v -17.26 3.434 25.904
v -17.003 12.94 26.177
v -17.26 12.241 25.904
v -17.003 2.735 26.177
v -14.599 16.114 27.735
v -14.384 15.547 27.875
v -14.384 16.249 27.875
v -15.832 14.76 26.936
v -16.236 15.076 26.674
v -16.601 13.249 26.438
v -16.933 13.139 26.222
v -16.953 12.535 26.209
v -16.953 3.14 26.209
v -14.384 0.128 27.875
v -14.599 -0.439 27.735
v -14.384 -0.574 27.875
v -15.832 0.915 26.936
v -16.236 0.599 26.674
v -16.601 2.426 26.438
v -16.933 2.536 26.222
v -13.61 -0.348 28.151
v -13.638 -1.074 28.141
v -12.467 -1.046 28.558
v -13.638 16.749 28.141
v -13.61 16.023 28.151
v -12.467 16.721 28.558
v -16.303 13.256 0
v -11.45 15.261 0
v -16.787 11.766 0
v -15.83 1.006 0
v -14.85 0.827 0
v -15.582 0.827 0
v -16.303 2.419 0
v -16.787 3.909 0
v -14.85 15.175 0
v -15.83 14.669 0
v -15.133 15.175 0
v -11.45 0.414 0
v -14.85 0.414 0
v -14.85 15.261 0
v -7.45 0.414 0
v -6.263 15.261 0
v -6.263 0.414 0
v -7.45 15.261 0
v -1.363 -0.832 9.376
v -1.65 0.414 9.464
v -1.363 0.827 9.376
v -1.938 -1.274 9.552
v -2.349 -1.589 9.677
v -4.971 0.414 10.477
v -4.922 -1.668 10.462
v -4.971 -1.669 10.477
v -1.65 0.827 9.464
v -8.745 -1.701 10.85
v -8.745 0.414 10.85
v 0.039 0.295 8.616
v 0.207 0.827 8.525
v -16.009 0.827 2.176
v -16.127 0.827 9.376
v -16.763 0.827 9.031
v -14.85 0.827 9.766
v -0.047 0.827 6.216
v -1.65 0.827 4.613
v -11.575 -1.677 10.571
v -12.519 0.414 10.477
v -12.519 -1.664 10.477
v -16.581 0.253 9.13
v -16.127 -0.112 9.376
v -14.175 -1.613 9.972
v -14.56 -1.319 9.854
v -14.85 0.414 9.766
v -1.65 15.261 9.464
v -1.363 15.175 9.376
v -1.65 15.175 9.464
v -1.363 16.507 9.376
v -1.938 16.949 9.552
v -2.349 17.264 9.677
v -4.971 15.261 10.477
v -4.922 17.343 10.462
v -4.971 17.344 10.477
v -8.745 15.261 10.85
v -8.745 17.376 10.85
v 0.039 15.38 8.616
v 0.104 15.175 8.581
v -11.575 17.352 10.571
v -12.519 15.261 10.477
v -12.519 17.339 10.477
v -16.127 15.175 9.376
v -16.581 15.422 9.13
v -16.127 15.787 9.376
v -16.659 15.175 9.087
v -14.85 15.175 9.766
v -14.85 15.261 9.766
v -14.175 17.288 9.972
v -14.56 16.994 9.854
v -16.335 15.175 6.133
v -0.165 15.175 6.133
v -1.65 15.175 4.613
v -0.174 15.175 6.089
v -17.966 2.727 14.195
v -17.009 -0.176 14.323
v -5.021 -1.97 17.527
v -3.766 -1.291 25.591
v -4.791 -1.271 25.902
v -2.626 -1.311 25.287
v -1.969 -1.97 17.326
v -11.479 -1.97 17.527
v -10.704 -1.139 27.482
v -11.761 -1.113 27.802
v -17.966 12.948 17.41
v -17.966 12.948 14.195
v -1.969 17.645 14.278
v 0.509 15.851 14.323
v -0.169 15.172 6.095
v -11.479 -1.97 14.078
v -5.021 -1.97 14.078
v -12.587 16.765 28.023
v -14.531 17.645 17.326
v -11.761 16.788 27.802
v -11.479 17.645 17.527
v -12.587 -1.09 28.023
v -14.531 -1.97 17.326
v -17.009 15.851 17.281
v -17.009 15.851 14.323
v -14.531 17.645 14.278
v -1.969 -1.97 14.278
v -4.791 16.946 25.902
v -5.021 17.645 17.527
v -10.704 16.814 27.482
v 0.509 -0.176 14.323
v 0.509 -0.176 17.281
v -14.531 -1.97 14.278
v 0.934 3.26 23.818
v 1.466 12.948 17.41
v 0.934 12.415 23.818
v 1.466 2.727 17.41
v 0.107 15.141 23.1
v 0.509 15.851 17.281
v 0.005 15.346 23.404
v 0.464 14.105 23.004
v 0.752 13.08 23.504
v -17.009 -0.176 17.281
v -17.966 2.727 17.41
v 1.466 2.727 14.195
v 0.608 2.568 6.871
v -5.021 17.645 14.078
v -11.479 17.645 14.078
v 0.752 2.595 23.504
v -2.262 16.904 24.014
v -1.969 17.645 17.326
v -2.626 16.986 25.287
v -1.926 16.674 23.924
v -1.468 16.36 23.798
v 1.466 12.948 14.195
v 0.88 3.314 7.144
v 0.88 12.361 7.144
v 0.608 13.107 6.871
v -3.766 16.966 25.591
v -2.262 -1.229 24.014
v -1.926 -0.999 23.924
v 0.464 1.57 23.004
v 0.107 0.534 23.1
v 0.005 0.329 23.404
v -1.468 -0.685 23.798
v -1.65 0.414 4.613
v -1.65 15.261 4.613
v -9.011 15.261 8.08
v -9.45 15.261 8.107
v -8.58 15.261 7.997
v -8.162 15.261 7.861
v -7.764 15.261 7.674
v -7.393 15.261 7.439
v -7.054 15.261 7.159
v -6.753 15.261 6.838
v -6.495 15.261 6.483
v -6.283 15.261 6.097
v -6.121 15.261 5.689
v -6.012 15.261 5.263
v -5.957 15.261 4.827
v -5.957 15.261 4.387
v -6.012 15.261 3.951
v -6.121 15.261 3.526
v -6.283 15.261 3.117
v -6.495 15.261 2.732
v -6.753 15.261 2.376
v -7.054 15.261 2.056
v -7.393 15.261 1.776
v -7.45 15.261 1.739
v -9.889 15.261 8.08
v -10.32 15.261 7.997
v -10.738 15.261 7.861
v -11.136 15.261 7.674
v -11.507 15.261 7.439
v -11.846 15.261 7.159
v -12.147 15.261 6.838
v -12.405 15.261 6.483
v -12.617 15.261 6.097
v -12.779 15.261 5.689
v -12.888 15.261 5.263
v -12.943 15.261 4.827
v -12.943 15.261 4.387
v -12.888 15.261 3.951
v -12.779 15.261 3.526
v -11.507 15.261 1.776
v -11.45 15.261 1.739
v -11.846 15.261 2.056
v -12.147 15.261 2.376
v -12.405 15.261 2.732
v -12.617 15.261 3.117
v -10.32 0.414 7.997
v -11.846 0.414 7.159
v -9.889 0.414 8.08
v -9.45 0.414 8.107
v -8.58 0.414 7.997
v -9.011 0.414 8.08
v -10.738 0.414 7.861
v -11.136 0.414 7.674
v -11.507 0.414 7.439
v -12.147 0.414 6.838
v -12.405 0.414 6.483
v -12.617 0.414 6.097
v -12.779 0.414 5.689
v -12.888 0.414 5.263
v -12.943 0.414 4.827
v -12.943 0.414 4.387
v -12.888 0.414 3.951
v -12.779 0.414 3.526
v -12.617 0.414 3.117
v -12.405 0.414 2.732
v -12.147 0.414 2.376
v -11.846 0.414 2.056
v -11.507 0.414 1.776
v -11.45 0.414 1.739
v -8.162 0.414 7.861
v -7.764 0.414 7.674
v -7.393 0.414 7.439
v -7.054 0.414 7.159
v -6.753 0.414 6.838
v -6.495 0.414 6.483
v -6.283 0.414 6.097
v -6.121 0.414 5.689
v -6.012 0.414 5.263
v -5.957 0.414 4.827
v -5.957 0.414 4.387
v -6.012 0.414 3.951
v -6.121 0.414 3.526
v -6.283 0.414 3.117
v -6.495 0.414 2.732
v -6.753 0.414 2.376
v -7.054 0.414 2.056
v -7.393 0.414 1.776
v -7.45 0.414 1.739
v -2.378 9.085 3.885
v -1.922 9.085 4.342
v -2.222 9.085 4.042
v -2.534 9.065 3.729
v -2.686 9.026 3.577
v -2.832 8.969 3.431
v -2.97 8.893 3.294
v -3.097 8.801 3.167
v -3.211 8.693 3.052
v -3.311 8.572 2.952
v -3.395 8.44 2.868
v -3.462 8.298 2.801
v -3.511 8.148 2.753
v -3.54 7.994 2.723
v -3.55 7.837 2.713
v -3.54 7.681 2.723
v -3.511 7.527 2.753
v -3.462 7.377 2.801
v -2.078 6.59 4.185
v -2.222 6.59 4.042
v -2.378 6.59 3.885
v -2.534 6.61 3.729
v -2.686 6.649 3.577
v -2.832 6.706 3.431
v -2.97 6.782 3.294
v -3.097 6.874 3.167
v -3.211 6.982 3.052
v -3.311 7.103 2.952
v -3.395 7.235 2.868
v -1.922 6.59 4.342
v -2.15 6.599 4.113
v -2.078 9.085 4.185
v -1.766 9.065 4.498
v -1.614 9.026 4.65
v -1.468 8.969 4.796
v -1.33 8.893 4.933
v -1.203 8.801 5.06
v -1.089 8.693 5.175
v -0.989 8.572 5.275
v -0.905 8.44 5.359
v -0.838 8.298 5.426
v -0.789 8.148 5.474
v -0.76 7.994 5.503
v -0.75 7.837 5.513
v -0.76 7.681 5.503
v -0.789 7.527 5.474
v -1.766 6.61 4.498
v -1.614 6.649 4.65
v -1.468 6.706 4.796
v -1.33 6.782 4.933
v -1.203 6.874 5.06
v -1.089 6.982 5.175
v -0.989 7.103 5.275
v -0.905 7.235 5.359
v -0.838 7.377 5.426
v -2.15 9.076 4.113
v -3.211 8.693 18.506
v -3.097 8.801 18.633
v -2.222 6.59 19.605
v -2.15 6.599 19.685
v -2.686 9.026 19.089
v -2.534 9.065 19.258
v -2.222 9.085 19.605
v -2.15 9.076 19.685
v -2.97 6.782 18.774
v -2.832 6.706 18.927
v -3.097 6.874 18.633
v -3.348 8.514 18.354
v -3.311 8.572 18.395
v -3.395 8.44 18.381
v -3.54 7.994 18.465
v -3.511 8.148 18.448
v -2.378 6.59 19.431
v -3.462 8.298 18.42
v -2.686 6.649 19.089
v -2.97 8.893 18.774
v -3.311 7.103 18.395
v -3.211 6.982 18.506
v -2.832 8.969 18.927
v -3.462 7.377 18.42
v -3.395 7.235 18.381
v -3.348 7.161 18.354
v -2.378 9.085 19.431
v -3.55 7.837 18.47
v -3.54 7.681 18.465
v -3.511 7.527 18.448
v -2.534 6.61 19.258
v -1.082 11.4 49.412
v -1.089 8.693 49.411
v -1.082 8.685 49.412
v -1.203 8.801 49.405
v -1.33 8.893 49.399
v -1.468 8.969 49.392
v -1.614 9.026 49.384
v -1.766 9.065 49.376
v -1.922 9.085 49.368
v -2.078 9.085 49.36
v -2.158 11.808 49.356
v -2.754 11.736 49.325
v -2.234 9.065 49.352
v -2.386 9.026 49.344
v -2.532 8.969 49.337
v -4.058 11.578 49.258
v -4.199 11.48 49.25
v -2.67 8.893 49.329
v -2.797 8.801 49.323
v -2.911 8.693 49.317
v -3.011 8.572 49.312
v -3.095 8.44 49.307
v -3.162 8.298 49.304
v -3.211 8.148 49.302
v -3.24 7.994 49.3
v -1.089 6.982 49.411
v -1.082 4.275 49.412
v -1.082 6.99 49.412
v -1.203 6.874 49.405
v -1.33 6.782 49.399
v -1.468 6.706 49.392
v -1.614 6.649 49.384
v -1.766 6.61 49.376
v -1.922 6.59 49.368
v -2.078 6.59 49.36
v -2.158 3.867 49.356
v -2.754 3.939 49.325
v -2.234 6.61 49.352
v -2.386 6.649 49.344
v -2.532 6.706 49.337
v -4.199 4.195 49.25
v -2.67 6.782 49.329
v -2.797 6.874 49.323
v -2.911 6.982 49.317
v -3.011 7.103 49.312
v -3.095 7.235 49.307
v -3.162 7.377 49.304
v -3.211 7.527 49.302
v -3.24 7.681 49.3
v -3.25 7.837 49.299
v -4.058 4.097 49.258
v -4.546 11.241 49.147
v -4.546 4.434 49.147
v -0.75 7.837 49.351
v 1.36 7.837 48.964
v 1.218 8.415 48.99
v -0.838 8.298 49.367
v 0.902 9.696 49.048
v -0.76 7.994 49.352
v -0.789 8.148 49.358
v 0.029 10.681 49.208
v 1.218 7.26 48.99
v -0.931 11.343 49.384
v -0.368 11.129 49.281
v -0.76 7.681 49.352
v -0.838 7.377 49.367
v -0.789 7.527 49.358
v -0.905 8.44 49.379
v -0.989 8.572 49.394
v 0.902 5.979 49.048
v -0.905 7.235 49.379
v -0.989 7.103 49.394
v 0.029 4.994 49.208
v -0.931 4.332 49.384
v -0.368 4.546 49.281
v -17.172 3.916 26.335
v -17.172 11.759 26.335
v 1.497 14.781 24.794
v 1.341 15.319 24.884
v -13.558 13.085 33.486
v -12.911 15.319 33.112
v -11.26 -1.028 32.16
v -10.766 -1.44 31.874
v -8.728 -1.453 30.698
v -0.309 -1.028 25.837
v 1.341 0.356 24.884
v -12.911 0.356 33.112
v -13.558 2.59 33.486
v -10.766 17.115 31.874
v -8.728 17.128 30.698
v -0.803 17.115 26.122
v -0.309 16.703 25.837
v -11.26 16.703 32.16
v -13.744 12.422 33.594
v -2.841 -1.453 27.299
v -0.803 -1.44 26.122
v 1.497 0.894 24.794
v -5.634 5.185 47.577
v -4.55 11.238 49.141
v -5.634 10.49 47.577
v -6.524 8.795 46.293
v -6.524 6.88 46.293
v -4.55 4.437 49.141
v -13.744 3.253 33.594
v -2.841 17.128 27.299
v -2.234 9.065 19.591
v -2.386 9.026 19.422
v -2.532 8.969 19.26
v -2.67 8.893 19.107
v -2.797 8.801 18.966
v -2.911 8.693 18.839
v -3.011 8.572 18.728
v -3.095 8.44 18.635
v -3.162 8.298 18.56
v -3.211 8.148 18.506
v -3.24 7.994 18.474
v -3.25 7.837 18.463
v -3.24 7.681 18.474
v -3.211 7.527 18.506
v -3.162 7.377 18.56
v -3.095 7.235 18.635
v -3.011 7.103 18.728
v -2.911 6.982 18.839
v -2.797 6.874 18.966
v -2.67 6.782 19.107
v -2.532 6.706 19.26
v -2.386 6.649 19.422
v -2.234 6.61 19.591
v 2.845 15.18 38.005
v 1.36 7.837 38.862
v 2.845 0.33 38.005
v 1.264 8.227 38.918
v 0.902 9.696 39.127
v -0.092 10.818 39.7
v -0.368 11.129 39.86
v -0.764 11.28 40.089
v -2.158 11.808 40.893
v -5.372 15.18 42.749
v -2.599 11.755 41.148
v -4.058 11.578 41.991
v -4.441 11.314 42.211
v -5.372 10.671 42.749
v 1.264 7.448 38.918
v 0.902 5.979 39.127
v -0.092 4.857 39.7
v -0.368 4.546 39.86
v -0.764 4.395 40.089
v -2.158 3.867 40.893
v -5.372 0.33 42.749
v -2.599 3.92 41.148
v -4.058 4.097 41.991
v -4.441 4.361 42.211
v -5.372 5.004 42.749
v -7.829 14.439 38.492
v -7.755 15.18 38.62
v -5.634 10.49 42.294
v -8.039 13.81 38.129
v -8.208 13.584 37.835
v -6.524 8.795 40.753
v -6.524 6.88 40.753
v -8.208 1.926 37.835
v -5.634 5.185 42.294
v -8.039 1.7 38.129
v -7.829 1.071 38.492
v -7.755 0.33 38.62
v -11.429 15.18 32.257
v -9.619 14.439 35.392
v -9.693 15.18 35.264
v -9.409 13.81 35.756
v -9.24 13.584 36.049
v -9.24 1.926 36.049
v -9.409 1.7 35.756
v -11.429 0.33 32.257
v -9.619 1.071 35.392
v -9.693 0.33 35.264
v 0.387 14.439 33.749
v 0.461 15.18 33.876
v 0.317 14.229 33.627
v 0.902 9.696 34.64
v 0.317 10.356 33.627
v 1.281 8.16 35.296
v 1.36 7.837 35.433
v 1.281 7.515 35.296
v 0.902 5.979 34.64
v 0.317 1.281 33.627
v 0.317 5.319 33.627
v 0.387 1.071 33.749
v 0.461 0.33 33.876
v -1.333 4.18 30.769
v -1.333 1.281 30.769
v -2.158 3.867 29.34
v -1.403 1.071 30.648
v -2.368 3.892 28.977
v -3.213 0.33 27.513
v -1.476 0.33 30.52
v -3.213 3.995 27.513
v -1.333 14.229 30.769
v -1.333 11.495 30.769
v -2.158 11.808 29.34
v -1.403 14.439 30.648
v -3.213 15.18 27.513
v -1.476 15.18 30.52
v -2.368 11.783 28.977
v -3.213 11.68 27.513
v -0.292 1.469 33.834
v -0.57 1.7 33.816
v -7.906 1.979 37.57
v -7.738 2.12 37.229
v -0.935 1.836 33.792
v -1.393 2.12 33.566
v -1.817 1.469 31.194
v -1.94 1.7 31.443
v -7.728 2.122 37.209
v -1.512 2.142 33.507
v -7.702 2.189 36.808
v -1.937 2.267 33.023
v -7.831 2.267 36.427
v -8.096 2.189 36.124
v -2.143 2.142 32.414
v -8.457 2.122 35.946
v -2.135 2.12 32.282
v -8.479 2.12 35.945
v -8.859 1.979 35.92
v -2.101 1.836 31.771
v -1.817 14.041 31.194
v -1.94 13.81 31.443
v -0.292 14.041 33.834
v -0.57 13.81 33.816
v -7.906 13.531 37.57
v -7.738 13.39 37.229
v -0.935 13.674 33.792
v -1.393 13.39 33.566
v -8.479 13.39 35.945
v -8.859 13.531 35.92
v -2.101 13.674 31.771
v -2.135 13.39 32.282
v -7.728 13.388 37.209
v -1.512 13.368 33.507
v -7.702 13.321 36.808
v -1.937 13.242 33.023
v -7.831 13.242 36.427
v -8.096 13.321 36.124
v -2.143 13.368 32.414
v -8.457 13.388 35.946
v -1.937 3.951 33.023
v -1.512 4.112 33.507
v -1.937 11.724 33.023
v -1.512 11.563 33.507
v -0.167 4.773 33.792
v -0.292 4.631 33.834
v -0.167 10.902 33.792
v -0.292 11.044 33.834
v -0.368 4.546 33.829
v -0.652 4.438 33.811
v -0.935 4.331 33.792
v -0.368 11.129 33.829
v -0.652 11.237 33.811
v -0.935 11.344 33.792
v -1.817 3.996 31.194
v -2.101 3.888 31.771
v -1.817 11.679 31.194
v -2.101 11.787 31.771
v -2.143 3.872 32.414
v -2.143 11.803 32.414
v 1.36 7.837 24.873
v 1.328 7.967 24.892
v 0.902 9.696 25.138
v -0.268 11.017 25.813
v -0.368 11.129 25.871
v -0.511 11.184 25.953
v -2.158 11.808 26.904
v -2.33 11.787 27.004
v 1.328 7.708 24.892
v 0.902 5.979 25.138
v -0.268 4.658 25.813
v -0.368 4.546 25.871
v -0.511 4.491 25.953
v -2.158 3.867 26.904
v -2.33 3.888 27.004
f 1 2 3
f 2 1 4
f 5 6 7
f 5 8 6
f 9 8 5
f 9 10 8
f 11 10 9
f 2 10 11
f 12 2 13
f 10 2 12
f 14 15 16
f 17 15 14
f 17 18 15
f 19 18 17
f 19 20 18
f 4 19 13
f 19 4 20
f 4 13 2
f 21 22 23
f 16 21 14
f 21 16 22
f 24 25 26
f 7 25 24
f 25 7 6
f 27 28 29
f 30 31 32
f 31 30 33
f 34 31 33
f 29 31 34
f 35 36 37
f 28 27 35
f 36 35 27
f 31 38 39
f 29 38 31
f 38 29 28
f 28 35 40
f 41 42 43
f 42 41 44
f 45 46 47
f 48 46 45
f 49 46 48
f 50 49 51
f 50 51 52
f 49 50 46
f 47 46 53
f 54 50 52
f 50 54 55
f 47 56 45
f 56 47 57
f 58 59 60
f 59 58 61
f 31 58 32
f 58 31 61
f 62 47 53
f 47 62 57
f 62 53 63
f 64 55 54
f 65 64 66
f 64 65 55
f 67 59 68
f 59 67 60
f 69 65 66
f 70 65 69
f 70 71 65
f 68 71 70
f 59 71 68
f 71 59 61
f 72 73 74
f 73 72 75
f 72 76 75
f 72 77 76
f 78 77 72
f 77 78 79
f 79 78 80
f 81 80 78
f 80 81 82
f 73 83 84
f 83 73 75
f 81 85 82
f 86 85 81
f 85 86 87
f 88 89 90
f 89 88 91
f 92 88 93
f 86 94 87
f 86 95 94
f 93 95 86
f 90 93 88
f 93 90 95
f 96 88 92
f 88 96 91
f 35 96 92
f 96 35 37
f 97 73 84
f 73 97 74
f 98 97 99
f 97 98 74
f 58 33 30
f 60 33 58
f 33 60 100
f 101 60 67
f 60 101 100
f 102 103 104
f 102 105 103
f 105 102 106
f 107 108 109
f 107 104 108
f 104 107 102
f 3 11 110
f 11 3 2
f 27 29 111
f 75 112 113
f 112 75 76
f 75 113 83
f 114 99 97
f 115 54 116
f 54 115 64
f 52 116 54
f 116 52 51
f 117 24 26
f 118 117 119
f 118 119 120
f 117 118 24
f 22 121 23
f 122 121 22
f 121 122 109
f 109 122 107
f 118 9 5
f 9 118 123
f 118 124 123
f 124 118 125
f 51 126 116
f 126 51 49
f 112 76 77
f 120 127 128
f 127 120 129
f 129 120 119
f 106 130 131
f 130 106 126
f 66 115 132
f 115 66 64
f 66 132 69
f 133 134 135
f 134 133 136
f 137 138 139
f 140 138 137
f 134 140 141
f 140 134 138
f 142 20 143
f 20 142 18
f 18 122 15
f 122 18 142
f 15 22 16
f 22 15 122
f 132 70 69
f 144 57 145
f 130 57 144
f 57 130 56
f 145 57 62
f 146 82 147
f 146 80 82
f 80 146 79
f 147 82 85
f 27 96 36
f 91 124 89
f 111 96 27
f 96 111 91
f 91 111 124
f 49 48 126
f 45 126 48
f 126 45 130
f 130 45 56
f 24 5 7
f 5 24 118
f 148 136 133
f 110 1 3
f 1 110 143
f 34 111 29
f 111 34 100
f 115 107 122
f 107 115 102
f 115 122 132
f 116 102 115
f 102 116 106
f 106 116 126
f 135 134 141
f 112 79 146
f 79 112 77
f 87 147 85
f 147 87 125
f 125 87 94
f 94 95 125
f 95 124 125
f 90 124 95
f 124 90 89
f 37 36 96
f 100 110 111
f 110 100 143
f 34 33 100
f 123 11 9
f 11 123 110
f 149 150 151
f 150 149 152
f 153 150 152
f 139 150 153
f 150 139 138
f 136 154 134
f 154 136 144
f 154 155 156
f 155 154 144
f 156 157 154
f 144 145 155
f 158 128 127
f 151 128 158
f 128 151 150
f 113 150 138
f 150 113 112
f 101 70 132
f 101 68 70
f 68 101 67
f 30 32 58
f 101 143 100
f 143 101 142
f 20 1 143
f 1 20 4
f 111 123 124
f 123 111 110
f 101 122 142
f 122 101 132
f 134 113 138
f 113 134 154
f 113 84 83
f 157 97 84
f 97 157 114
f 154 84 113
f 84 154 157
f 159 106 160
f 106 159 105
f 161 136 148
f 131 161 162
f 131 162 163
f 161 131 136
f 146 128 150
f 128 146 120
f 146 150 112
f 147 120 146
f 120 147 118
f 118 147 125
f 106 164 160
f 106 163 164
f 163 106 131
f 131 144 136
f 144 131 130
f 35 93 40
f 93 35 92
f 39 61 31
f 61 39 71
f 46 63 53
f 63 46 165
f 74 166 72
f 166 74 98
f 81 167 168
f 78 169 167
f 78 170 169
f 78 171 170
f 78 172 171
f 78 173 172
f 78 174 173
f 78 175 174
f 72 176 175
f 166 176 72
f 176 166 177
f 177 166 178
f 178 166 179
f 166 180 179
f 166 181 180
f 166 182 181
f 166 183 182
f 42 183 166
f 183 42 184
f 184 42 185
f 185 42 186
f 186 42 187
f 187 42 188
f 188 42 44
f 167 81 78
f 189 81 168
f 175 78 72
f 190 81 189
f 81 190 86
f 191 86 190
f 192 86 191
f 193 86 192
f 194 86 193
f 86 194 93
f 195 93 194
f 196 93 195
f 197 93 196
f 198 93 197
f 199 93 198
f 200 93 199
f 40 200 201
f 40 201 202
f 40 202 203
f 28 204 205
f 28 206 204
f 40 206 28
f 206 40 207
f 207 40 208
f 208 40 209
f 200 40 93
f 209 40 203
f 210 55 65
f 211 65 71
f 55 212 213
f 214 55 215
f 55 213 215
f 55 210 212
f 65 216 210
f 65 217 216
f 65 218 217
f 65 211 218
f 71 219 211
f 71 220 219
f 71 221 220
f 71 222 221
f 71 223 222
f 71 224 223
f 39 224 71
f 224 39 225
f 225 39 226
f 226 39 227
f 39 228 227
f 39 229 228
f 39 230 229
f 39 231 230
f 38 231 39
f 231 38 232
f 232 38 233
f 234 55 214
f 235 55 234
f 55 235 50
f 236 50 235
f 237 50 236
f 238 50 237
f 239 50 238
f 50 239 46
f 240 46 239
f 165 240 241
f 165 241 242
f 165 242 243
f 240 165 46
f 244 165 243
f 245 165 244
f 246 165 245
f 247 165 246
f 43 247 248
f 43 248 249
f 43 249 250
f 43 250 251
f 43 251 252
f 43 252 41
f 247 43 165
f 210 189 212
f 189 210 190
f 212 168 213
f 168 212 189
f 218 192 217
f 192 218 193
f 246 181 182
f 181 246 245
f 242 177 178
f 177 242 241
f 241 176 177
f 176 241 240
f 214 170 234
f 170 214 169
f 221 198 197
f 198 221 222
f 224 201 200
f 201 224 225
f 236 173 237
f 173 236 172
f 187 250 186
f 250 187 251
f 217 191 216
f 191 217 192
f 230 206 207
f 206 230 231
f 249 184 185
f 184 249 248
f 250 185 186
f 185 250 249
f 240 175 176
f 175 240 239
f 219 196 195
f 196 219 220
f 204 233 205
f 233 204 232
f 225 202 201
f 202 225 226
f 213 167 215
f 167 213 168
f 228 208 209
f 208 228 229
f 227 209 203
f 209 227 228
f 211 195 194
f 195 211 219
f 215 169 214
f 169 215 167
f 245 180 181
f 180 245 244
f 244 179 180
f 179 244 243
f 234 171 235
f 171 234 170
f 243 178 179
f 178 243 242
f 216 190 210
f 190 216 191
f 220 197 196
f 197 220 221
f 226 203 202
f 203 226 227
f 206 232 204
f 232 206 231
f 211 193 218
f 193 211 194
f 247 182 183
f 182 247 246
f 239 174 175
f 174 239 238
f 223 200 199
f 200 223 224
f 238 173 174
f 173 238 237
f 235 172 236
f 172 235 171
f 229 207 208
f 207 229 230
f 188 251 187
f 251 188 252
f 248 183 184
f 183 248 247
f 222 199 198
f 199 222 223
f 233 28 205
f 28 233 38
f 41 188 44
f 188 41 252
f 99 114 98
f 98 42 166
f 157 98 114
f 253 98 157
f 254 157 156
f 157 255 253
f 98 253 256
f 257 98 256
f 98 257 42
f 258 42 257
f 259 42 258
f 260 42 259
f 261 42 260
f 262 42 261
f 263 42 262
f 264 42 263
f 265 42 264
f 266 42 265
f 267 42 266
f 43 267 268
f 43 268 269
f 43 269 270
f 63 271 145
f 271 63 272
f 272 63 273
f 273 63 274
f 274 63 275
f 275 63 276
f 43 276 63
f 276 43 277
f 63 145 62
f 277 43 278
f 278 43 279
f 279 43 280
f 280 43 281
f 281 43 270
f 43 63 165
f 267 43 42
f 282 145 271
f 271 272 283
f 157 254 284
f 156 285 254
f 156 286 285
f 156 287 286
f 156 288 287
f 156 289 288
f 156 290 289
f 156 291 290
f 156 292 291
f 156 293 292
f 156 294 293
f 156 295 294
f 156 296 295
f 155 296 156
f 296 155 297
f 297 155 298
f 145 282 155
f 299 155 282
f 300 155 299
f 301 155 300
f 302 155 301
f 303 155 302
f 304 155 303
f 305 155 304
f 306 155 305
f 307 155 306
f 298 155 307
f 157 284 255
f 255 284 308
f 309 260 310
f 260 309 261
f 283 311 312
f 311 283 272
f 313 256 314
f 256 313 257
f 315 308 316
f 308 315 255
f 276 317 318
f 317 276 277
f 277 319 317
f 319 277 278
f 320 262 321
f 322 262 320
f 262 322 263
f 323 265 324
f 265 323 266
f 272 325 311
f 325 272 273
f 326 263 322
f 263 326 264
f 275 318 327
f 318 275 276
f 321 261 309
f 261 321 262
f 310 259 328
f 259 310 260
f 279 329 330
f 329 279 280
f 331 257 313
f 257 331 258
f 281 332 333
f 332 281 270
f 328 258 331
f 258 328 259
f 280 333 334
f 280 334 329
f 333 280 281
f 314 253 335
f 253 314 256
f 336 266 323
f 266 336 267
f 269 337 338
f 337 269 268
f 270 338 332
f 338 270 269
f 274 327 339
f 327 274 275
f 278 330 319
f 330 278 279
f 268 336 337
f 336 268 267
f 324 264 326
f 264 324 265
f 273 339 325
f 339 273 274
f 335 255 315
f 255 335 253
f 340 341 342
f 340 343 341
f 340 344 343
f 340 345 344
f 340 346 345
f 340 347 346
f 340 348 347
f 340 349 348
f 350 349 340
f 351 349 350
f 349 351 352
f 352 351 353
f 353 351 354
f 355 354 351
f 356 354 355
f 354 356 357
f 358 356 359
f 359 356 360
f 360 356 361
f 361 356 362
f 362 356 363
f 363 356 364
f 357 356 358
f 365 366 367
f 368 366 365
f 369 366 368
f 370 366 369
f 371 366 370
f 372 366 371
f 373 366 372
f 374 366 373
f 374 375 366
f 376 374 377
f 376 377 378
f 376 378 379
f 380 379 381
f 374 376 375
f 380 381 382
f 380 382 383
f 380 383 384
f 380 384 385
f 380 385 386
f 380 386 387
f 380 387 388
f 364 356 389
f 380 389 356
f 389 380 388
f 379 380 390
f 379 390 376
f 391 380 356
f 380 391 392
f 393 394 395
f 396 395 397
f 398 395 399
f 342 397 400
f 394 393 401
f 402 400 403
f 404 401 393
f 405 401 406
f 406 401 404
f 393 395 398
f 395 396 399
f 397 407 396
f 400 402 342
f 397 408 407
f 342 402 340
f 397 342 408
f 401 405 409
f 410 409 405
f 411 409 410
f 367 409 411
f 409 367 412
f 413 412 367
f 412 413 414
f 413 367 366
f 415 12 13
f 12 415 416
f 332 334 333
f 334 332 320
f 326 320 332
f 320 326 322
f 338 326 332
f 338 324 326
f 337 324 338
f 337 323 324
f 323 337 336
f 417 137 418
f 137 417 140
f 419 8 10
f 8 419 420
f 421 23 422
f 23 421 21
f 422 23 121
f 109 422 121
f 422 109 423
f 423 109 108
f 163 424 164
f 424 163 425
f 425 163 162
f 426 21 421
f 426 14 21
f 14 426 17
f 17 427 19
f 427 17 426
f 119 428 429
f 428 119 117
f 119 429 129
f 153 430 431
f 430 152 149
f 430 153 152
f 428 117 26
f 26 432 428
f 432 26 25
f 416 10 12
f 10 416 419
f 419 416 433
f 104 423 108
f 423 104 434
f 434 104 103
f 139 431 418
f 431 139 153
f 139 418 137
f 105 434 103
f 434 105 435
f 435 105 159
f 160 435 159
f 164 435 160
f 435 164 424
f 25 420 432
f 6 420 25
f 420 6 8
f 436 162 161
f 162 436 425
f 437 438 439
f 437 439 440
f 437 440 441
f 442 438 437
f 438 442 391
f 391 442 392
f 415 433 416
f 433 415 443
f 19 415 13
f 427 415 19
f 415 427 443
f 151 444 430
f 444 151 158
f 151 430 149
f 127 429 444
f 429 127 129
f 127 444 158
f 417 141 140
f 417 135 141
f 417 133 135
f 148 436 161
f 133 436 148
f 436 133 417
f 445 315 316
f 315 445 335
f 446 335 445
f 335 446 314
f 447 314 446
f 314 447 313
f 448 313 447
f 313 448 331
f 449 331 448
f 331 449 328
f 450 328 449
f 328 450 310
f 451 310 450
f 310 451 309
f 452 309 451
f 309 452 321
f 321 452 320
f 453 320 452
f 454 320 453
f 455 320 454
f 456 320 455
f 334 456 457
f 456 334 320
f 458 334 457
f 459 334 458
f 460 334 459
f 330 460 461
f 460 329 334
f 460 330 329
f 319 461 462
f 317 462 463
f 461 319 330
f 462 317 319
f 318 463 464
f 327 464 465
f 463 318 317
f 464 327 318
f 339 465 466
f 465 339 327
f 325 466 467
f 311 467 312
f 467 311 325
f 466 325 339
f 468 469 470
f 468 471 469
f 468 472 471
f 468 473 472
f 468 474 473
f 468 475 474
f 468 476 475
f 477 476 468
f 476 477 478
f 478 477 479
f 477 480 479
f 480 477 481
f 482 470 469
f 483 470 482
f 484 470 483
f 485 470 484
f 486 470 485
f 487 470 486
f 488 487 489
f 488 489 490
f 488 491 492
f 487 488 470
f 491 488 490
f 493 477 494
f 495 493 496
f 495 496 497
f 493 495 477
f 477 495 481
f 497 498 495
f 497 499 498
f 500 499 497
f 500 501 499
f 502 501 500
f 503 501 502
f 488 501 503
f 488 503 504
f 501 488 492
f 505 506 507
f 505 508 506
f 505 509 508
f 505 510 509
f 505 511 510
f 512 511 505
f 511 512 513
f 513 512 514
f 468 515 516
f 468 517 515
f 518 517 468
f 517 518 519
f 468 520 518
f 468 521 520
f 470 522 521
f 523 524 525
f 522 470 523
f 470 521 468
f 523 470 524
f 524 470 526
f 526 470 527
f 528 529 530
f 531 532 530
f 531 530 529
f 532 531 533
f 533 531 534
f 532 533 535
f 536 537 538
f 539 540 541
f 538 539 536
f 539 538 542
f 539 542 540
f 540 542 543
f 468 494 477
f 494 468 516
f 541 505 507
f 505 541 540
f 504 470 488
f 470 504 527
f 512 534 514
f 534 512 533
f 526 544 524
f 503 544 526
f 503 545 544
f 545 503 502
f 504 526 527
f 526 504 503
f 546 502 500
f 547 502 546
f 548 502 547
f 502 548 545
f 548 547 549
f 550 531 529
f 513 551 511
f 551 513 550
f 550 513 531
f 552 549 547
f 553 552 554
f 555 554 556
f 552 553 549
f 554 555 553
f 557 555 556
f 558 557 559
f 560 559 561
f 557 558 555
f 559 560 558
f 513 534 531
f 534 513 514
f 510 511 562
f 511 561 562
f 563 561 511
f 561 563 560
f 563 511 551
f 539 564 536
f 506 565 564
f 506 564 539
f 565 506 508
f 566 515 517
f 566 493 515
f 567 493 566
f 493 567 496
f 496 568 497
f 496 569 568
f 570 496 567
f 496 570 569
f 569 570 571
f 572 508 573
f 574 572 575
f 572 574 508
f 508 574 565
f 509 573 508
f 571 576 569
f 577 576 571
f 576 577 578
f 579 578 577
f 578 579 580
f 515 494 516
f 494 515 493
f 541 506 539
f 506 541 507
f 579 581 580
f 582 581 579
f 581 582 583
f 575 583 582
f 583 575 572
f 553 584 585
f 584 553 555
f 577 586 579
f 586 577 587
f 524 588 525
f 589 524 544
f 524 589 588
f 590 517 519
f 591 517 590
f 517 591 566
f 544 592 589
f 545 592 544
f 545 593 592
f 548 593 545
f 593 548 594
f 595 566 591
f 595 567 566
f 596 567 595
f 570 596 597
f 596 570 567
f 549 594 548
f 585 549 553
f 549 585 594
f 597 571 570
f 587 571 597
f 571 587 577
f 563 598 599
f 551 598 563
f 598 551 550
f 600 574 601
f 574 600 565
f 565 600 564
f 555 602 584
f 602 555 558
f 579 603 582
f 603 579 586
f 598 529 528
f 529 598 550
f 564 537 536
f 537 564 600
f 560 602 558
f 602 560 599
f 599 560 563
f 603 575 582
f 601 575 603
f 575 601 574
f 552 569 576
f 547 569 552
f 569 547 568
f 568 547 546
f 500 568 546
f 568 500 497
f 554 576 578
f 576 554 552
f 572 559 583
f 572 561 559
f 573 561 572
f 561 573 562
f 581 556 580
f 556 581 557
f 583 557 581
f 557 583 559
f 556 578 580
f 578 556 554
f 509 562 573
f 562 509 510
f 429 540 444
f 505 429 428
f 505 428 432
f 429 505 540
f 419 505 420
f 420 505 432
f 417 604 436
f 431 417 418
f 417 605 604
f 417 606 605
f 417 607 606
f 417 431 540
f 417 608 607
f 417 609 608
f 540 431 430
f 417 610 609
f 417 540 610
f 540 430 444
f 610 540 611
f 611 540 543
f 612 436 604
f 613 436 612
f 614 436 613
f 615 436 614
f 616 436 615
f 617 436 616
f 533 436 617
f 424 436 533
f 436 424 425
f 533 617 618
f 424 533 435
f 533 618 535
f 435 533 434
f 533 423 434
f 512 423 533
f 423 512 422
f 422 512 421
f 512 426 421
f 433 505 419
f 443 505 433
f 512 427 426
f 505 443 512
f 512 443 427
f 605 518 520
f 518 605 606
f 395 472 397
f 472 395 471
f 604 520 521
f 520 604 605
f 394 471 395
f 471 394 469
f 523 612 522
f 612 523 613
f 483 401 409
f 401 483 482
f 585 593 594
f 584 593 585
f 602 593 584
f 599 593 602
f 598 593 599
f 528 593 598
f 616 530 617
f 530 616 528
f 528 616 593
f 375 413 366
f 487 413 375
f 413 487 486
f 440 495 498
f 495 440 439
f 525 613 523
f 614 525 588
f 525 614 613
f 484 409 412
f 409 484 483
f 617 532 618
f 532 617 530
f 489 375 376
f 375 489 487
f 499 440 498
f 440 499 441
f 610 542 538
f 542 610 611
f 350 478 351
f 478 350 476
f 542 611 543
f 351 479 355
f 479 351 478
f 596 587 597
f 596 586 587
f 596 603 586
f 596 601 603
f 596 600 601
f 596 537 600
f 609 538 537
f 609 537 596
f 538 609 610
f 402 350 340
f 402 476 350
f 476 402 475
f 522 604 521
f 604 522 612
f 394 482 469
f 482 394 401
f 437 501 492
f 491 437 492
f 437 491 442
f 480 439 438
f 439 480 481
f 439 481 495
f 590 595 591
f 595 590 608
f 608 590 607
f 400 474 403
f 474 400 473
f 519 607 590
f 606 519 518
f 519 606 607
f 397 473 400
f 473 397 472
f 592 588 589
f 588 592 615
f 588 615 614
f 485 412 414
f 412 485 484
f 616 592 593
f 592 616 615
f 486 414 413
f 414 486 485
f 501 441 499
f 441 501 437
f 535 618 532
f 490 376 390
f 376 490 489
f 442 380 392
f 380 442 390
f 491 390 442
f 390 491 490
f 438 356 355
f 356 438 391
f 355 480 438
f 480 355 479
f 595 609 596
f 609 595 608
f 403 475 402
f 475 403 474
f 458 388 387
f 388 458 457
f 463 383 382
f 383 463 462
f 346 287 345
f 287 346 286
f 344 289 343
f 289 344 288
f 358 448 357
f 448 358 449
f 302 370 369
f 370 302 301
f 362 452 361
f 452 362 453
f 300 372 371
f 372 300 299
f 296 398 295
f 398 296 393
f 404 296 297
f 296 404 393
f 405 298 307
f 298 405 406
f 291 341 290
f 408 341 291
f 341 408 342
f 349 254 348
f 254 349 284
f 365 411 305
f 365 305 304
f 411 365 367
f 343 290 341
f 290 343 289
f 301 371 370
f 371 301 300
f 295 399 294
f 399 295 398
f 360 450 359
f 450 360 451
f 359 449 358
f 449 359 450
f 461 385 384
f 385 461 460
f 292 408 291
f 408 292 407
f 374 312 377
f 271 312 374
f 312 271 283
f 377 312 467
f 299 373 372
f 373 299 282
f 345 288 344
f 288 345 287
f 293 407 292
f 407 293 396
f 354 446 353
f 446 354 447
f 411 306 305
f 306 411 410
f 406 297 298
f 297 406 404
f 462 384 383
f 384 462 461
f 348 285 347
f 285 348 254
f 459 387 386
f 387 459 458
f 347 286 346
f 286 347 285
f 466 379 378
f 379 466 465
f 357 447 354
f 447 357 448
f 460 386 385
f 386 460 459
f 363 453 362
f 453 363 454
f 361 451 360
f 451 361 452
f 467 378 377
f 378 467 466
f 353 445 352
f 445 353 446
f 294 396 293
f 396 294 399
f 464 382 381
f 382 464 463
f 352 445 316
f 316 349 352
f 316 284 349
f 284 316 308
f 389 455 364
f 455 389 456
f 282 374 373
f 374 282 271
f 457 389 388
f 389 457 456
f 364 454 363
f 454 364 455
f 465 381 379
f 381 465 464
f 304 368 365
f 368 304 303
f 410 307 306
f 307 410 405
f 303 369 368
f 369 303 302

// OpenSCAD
// file: util/finger_mid.scad
include <../../config.scad>
use <finger_base.scad>

rotate([0,-90,0]) fingermid();

//	Middle segment of finger, can be lengthened
module fingermid(length=19, proximalHole=true, distalHole=true)
{
	difference() {
		scale([yScaleFactor,xScaleFactor,zScaleFactor]) {
			fingerbasesolid(length);
		}
		if(proximalHole) {
			translate([0,knucklePadding/2 * xScaleFactor,0]) fingerhardwarecutouts(jointDia, jointThick, knuckleW=knuckleW-knucklePadding, fingerLen=length);
		}
		if(distalHole) {
			translate([length * yScaleFactor,0,0]) mirror([1,0,0]) fingerhardwarecutouts(jointDia, jointThick, knuckleW=knuckleW, fingerLen=length);
		}
	}
}
// file: util/finger_base.scad
include <../../config.scad>

rotate([0,-90,0]) fingerbase();

//	Base segment of finger, can be lengthened
module fingerbase(length=20, proximalHole=true, distalHole=true)
{
	difference() {
		scale([yScaleFactor,xScaleFactor,zScaleFactor]) {
			fingerbasesolid(length);
		}
		if(proximalHole) {
			translate([0,knucklePadding/2 * xScaleFactor,0]) fingerhardwarecutouts(jointDia, jointThick, knuckleW=knuckleW-knucklePadding, fingerLen=length);
		}
		if (distalHole) {
			translate([length * yScaleFactor,0,0]) mirror([1,0,0]) fingerhardwarecutouts(jointDia, jointThick, knuckleW=knuckleW, fingerLen=length);
		}
	}


	
}

module fingerhardwarecutouts(jointDia,jointThick,knuckleW,fingerLen,holeCutoff=100) {
	//slot for flex joint
	translate([7 - (15/jointDia),0,6*zScaleFactor - (1.8/jointThick)]) {
		rotate([90,0,0]) translate([-0.25,0,-knuckleW*xScaleFactor]) cylinder(d=jointDia, h=knuckleW*xScaleFactor, $fn=50);
		translate([-25,(knuckleW*xScaleFactor) / 2,0]) cube([50,knuckleW*xScaleFactor,jointThick], center=true);
	}
	//cubic parts
	translate([-100,0,0]) cube([100,knuckleW*xScaleFactor,100]);
	translate([-13/zScaleFactor,0,0]) rotate([0,45,0]) translate([-50,0,0]) cube([100,knuckleW * xScaleFactor, 10]);

	//channel for string/tendon
	translate([-fingerLen/2 * yScaleFactor, knuckleW/2 * xScaleFactor, 2.3]) rotate([0,90,0]) cylinder(d=2.5, h=holeCutoff, $fn=50);
}

//	base segment of finger, solid
module fingerbasesolid(length=50, cutout=true) {
	difference() {
		//cubic part
		translate([0,0.001 + knucklePadding/2,1]) cube([length, knuckleW - knucklePadding - 0.002, 8]);
	}
	
	//cylindrical-ish part around finger
	intersection() {
		//overly large shape to get the cross section in the XZ plane from
		difference() {
			union() {
				translate([length-4,-5,5]) rotate([-90,0,0]) cylinder(r=8,h=knuckleW + 10);
				translate([0,-5,-5]) cube([length,knuckleW + 10,20]);
			}
			//cutout for the side "guards" of the previous knuckle
			if(cutout) {
				translate([-4,-knuckleW+0.001,5.3]) rotate([-90,0,0]) cylinder(r=11,h=10);
				translate([-4,knuckleW - knucklePadding*(1/xScaleFactor),5.3]) rotate([-90,0,0]) cylinder(r=11,h=10);
			}
		}

		hull() {
			for(i=[-1,1], j=[-1,1]) {
				//angled cylinders to provide the outer shape of the finger
				translate([length/10,i*2.4 + knuckleW/2,j*2.2 + 5]) rotate([i*j*-4,j*86,0]) cylinder(d=6,h=20,center=true);
				translate([length+4, i*2.4 + knuckleW/2, j*2.2 + 5]) rotate([i*j*-4,j*-86,0]) cylinder(d=6,h=20,center=true);
			}
		}
	}
}
// file: util/finger_tip.scad
include <../../config.scad>
use <finger_base.scad>
use <finger_mid.scad>

rotate([0,-90,0]) fingertip_curved_solid(pad=fingerPads);

module fingertip_curved_solid(length=17, pad=true, hole=true) {
//	if (!pad)
//		fingertip(length=length);
//	else {
		render() difference() {
			union() {
				fingermid(length=length+3, proximalHole=true, distalHole=false);
				translate([length*yScaleFactor - 0.5,0,1.6*zScaleFactor]) rotate([0,30,0]) fingertip(length=15, proximalHole=false, cutout=false);
			}
			//hole for string
			if(hole) translate([0,xScaleFactor * knuckleW/2,2]) rotate([0,90,0]) cylinder(d=2.5,h=100, $fn=50);
			//hollow for soft pad
			if(pad) translate([length*yScaleFactor - 0.5,0,1.6*zScaleFactor]) rotate([0,30,0]) fingertip_pad(length=15);
		}
//	}
}

module fingertip_solid(length=15, pad=true) {
	if (!pad)
		fingertip(length=length);
	else {
		render() difference() {
			fingertip(length=length);
			if(pad) fingertip_pad(length);
		}
	}
}

module fingertip_pad(length) {
	difference() {
		fingertip(length,pad=false, proximalHole=false, cutout=false);
		translate([0,-10,-10]) cube([length-7,50,50]);
		assign($fn = 16) difference() {
			translate([0,0.2*xScaleFactor,3.2*zScaleFactor]) cube([length+(3.3*yScaleFactor),xScaleFactor * (knuckleW - knucklePadding),5.75*zScaleFactor]);
			//grooves for attachment of silicone pad:
			translate([(length+(3.3*yScaleFactor))/3*2, 0.2*xScaleFactor, 3.2*zScaleFactor]) cylinder(d=2.5*yScaleFactor,h=5.75*zScaleFactor);
			translate([(length+(3.3*yScaleFactor))/3*2, 0.2*xScaleFactor + (xScaleFactor * (knuckleW - knucklePadding)), 3.2*zScaleFactor]) cylinder(d=2.5*yScaleFactor,h=5.75*zScaleFactor);
			translate([(length+(3.3*yScaleFactor))/3*2, 0.2*xScaleFactor, 3.2*zScaleFactor]) rotate([-90,0,0]) cylinder(d=2*zScaleFactor,h=xScaleFactor * (knuckleW - knucklePadding));
			translate([(length+(3.3*yScaleFactor))/3*2, 0.2*xScaleFactor, 3.2*zScaleFactor + 5.75*zScaleFactor]) rotate([-90,0,0]) cylinder(d=1.25*zScaleFactor,h=xScaleFactor * (knuckleW - knucklePadding));
		}
		//"fingernail":
		translate([0,xScaleFactor * knuckleW/2,0]) {
			rotate([0,60,0]) cylinder(d=8, h=100);
		}
	}
}

//	tip segment of finger, can be lengthened
module fingertip(length=15, proximalHole=true, cutout=true)
{
	intersection() {
		difference() {
			scale([yScaleFactor,xScaleFactor,zScaleFactor]) {
				fingerbasesolid(length,cutout);
			}
			if(proximalHole) {
				translate([0,knucklePadding/2 * xScaleFactor,0]) fingerhardwarecutouts(jointDia, jointThick, knuckleW=knuckleW-knucklePadding, fingerLen=length, holeCutoff=(length-0.5)*2);
				translate([(length - 5) * yScaleFactor,(knuckleW/2) * xScaleFactor,0])
					rotate([0,30,0]) translate([0,0,2]) cylinder(d=2.5, h=100, $fn=50);
			}
		}
		translate([(length-10)*xScaleFactor,0,21*zScaleFactor]) rotate([-90,0,0]) cylinder(d=70, h=100, center=true);
	}
}
// file: ../config.scad
/**
 * Configuration settings for Flexy Beast, required to generate correctly sized STLs of the printed parts. See the Configuration File Assembly instructions to set this up.
 * @id config_file
 * @name Configuration File
 * @category Prerequisites!
 * @step Open config.scad in your favorite text editor.
 * @step As per the normal Cyborg Beast instructions, measure the width of the knuckles in the non-affected hand and convert to millimeters.
 * @step Add 5 to that result and then divide by 55.
 * @step Replace the x-, y-, and zScaleFactor variables in config.scad with that number.
 * @step If desired, adjust the proportions of the hand by changing those variables individually. xScaleFactor controls the width of the hand, yScaleFactor controls the length, and zScaleFactor controls the height.
 * @step Open assembly.scad in OpenSCAD to check that the flexy joint holes are not too large for the hand (should only be necessary for small children). If necessary, reduce the jointDia and jointThick variables. jointDia=5 and jointThick=2 is a good amount for smaller hands.
 * @step Set the fingerPads variable to true or false depending on whether you want to cast silicone finger pads for improved grip.
 * @step Open palm.scad, finger_base.scad, finger_tip.scad, and thumb_tip.scad in OpenSCAD, render each part (F6), and export as STL, then print. Suggested print settings are 0.2mm or smaller layer height, 3 perimeters, and 25% rectilinear or hexagonal infill.
 */

knuckleR = 4.85;
knucklePadding = 0.5;
knuckleW = 9.5;
wristH = 10;
palmH = 20;
palmW = 64;
th = 3;
fn = 32;

//flexy joint parameters
jointDia = 7;
jointThick = 4;

//finger settings
fingerPads = true; //whether or not to hollow the finger tips slightly for molding pads
fingerLength = 1; //multiply the length of all fingers by this amount
thumbProp = 0.8; //proportion of thumb length relative to other fingers (note that the thumb is a segment shorter than the other fingers already)
indexProp = 0.8; //proportion of index finger length relative to other fingers
middleProp = 1; //proportion of middle finger length relative to other fingers
ringProp = 0.8; //proportion of ring finger length relative to other fingers
pinkyProp = 0.7; //proportion of pinky finger length relative to other fingers

//misc settings
thermoform = true; //whether or not to generate a thermoformable mesh for the palm

//desired scale factor for hand based on the standard Cyborg Beast/Robohand sizing guide
xScaleFactor = 1.65; // [1.05:1.60]
yScaleFactor = 1.55; // [1.05:1.60]
zScaleFactor = 1.65; // [1.05:1.60]
// main file
include <../config.scad>
use <util/finger_tip.scad>

rotate([0,-90,0]) fingertip_curved_solid(length = 17*pinkyProp*fingerLength, pad=fingerPads);

/**
 * Distal phalanx of pinky finger - rendered from parts/finger_pinky_tip.scad
 * @id pinky_tip
 * @name Pinky Finger Tip
 * @category Printed
 */
